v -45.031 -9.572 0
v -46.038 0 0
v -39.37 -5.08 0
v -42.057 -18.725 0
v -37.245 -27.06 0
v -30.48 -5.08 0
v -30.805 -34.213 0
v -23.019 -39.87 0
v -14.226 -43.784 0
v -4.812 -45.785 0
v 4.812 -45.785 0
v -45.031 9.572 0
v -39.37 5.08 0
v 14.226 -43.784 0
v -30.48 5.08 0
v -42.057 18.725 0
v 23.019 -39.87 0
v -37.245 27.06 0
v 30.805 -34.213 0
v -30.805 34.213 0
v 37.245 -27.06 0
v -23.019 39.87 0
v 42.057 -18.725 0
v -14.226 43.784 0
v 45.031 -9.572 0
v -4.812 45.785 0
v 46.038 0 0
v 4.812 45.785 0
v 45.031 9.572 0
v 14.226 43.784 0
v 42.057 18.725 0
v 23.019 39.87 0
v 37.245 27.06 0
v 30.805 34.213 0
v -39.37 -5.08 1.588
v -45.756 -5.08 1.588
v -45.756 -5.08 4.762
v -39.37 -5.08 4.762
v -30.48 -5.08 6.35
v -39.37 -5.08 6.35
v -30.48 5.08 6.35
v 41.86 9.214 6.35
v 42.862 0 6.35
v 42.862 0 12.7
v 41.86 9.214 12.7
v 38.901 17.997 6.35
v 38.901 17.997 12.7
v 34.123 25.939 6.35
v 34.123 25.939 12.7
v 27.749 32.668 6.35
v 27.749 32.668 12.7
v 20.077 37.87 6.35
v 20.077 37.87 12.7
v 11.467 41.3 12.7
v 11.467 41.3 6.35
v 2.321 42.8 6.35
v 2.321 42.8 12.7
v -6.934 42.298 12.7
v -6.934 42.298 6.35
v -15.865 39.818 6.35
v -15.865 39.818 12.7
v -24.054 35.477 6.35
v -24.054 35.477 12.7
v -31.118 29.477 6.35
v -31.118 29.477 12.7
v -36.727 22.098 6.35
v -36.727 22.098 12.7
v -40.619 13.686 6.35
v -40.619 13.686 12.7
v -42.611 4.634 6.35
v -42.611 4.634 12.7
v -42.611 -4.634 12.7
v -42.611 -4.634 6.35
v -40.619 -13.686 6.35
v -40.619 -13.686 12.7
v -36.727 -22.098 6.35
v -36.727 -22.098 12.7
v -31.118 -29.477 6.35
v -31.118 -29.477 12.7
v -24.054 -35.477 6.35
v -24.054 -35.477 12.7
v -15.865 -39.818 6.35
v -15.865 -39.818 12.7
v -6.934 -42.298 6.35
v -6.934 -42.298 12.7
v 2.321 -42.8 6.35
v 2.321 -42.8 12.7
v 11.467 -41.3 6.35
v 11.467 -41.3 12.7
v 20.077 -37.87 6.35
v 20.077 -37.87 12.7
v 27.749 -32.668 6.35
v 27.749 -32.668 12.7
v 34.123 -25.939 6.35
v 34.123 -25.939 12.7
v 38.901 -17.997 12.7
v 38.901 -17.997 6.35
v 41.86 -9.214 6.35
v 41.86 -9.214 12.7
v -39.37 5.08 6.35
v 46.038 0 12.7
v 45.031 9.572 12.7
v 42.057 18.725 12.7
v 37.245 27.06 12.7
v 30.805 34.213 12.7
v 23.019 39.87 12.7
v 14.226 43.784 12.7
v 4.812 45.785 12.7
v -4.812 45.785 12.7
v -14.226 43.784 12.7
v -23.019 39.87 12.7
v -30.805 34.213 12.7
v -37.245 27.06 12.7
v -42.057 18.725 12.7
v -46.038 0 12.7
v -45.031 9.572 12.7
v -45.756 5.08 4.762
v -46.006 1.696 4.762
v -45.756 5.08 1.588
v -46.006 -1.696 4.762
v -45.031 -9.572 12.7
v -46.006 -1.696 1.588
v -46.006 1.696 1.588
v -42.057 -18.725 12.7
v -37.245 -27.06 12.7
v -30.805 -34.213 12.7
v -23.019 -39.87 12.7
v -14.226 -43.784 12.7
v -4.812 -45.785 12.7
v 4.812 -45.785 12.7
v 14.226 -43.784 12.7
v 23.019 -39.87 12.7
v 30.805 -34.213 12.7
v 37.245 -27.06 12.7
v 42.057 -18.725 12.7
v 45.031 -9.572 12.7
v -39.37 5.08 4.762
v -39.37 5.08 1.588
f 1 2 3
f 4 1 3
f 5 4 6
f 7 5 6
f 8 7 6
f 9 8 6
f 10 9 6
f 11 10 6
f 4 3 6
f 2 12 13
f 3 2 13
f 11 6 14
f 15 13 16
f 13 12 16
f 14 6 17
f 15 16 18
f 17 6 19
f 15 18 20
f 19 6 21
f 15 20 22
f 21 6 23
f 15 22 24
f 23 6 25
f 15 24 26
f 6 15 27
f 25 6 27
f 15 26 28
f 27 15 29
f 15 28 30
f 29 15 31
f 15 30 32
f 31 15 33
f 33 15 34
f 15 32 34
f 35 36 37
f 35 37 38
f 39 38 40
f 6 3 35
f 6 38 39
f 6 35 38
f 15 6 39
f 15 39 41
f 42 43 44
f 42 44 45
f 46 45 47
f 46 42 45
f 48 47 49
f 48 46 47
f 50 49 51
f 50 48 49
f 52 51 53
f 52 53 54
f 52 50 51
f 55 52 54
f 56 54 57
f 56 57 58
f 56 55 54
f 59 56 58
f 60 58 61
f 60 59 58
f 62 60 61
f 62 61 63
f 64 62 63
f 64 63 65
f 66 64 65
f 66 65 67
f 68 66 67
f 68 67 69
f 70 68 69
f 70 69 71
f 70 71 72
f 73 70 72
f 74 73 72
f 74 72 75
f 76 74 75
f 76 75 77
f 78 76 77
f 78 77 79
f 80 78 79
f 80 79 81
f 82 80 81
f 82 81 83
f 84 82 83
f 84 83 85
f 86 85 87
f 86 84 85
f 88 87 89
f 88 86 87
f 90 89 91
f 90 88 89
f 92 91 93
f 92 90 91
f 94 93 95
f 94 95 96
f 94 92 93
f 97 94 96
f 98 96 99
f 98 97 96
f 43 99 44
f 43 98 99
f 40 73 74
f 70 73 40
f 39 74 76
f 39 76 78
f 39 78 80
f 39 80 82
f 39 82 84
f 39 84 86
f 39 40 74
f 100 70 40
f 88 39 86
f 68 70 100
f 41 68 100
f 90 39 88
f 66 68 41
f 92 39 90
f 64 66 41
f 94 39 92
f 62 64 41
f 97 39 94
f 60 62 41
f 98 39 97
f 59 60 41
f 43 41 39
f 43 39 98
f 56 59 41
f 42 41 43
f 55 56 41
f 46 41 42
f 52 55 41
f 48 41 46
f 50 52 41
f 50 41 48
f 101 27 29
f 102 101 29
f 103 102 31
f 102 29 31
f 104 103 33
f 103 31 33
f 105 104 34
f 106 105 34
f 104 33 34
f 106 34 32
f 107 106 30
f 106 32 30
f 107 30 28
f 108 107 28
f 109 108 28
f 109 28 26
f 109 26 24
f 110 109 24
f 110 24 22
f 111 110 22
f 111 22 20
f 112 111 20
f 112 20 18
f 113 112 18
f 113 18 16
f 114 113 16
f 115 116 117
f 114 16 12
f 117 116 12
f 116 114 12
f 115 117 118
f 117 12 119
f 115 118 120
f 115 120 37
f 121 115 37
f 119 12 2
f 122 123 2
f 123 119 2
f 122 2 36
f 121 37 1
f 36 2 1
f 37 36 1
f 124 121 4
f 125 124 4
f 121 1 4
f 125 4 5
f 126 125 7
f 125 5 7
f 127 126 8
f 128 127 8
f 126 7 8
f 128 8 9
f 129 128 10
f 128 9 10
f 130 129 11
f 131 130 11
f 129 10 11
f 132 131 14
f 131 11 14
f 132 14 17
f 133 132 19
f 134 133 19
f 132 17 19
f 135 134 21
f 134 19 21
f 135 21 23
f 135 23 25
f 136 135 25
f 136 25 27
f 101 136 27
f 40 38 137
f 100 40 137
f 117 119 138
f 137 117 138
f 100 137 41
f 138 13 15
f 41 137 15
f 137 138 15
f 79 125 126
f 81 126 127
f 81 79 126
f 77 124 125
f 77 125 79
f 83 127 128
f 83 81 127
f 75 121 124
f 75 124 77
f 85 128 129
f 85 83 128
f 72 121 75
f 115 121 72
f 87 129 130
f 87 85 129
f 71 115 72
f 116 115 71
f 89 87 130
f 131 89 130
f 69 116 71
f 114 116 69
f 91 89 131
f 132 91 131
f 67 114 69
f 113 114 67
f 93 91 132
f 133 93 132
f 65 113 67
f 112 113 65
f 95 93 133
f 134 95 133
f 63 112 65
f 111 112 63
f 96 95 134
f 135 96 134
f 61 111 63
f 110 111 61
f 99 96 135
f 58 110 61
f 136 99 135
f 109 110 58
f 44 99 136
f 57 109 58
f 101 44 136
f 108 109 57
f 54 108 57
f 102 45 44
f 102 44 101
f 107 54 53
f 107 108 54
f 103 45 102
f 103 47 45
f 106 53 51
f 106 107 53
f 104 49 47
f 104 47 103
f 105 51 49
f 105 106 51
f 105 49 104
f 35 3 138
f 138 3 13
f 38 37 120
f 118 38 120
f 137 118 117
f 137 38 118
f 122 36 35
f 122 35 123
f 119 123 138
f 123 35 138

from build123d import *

# Parameters (mm, degrees)
F0_R     = 46.0375
F0_R_2   = 42.8625
F1_DEPTH = 12.7
F0_W     = 8.89
F0_H     = 10.16
F2_DEPTH = 6.35
F3_W     = 10.16
F3_H     = 3.175
F4_DEPTH = 6.6685


with BuildPart() as f1:
    # F0 (on Top) → F1 (new body)
    with BuildSketch(Plane.XY):
        Circle(F0_R)
        Circle(F0_R_2, mode=Mode.SUBTRACT)
    extrude(amount=F1_DEPTH)

    # F0 (on Top) → F2 (join)
    with BuildSketch(Plane.XY):
        Circle(F0_R_2)
        with Locations((-34.925, 0)):
            Rectangle(F0_W, F0_H, mode=Mode.SUBTRACT)
    extrude(amount=F2_DEPTH)

    # F3 (on face) → F4 (cut, through all)
    with BuildSketch(Plane.YZ.offset(-39.37)):
        with Locations((0, 3.175)):
            Rectangle(F3_W, F3_H)
    extrude(amount=-F4_DEPTH, mode=Mode.SUBTRACT)


solid = f1.part
